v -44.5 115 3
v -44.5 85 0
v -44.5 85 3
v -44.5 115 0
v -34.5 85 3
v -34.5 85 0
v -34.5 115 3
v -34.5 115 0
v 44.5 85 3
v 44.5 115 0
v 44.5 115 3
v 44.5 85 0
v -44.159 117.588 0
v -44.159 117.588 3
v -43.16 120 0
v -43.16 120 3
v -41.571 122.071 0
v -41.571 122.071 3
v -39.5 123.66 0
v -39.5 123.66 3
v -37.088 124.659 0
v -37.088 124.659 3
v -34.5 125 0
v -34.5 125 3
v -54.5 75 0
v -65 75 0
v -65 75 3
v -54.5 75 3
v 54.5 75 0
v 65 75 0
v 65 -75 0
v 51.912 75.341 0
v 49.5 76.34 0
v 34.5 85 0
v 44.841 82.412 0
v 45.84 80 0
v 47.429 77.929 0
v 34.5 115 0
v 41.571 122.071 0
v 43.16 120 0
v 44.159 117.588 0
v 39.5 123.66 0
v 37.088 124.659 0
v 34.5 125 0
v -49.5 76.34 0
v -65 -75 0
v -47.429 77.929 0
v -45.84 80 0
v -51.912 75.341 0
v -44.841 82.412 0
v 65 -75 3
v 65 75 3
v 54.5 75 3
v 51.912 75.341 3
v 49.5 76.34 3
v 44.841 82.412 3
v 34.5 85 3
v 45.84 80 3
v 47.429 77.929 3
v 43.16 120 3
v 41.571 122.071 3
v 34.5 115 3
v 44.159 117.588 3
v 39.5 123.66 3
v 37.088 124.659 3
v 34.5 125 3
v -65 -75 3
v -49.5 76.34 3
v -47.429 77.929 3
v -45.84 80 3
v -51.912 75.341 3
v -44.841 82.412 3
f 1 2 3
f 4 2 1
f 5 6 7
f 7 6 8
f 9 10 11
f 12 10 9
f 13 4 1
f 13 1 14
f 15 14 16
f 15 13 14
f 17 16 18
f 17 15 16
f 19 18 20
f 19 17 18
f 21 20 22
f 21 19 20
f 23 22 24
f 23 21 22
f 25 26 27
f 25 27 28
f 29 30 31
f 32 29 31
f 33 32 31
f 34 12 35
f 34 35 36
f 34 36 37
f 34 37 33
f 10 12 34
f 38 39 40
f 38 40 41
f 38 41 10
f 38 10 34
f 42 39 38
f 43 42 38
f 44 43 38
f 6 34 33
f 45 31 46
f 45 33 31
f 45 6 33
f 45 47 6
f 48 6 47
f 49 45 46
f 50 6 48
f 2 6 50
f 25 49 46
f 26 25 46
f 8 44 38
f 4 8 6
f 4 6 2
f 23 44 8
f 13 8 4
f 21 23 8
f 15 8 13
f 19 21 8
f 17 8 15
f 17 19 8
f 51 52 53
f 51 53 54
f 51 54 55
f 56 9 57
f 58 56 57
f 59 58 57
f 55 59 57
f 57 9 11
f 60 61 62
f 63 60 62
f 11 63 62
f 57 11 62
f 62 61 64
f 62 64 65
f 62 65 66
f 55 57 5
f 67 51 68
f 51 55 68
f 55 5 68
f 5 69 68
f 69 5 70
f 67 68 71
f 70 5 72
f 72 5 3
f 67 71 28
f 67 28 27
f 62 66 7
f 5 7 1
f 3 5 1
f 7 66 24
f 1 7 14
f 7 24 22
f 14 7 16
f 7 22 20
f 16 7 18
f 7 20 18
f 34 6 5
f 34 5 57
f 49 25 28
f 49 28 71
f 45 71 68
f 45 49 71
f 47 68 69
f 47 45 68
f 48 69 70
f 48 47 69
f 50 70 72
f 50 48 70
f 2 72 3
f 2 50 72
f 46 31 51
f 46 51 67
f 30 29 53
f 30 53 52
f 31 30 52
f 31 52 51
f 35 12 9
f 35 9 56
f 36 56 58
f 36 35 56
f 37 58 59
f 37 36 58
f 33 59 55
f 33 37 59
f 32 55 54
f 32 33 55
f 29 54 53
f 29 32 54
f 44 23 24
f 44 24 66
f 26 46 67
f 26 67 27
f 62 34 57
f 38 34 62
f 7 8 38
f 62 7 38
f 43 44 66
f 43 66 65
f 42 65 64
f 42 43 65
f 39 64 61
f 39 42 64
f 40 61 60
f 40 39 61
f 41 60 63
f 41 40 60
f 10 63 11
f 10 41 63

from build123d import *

# Parameters (mm, degrees)
SKETCH1_W           = 69
SKETCH1_H           = 30
BOSS_EXTRUDE1_DEPTH = 3


with BuildPart() as part:
    # Sketch1 → Boss-Extrude1 (new body)
    with BuildSketch(Plane.XY):
        with BuildLine():
            Line((-65, 75), (-54.5, 75))
            ThreePointArc((-54.5, 75), (-47.428932188, 77.928932188), (-44.5, 85))
            Line((-44.5, 85), (-44.5, 115))
            ThreePointArc((-44.5, 115), (-41.571067812, 122.071067812), (-34.5, 125))
            Line((-34.5, 125), (34.5, 125))
            ThreePointArc((34.5, 125), (41.571067812, 122.071067812), (44.5, 115))
            Line((44.5, 115), (44.5, 85))
            ThreePointArc((44.5, 85), (47.428932188, 77.928932188), (54.5, 75))
            Line((54.5, 75), (65, 75))
            Line((65, 75), (65, -75))
            Line((65, -75), (-65, -75))
            Line((-65, -75), (-65, 75))
        make_face()
        with Locations((0, 100)):
            Rectangle(SKETCH1_W, SKETCH1_H, mode=Mode.SUBTRACT)
    extrude(amount=BOSS_EXTRUDE1_DEPTH)


solid = part.part
